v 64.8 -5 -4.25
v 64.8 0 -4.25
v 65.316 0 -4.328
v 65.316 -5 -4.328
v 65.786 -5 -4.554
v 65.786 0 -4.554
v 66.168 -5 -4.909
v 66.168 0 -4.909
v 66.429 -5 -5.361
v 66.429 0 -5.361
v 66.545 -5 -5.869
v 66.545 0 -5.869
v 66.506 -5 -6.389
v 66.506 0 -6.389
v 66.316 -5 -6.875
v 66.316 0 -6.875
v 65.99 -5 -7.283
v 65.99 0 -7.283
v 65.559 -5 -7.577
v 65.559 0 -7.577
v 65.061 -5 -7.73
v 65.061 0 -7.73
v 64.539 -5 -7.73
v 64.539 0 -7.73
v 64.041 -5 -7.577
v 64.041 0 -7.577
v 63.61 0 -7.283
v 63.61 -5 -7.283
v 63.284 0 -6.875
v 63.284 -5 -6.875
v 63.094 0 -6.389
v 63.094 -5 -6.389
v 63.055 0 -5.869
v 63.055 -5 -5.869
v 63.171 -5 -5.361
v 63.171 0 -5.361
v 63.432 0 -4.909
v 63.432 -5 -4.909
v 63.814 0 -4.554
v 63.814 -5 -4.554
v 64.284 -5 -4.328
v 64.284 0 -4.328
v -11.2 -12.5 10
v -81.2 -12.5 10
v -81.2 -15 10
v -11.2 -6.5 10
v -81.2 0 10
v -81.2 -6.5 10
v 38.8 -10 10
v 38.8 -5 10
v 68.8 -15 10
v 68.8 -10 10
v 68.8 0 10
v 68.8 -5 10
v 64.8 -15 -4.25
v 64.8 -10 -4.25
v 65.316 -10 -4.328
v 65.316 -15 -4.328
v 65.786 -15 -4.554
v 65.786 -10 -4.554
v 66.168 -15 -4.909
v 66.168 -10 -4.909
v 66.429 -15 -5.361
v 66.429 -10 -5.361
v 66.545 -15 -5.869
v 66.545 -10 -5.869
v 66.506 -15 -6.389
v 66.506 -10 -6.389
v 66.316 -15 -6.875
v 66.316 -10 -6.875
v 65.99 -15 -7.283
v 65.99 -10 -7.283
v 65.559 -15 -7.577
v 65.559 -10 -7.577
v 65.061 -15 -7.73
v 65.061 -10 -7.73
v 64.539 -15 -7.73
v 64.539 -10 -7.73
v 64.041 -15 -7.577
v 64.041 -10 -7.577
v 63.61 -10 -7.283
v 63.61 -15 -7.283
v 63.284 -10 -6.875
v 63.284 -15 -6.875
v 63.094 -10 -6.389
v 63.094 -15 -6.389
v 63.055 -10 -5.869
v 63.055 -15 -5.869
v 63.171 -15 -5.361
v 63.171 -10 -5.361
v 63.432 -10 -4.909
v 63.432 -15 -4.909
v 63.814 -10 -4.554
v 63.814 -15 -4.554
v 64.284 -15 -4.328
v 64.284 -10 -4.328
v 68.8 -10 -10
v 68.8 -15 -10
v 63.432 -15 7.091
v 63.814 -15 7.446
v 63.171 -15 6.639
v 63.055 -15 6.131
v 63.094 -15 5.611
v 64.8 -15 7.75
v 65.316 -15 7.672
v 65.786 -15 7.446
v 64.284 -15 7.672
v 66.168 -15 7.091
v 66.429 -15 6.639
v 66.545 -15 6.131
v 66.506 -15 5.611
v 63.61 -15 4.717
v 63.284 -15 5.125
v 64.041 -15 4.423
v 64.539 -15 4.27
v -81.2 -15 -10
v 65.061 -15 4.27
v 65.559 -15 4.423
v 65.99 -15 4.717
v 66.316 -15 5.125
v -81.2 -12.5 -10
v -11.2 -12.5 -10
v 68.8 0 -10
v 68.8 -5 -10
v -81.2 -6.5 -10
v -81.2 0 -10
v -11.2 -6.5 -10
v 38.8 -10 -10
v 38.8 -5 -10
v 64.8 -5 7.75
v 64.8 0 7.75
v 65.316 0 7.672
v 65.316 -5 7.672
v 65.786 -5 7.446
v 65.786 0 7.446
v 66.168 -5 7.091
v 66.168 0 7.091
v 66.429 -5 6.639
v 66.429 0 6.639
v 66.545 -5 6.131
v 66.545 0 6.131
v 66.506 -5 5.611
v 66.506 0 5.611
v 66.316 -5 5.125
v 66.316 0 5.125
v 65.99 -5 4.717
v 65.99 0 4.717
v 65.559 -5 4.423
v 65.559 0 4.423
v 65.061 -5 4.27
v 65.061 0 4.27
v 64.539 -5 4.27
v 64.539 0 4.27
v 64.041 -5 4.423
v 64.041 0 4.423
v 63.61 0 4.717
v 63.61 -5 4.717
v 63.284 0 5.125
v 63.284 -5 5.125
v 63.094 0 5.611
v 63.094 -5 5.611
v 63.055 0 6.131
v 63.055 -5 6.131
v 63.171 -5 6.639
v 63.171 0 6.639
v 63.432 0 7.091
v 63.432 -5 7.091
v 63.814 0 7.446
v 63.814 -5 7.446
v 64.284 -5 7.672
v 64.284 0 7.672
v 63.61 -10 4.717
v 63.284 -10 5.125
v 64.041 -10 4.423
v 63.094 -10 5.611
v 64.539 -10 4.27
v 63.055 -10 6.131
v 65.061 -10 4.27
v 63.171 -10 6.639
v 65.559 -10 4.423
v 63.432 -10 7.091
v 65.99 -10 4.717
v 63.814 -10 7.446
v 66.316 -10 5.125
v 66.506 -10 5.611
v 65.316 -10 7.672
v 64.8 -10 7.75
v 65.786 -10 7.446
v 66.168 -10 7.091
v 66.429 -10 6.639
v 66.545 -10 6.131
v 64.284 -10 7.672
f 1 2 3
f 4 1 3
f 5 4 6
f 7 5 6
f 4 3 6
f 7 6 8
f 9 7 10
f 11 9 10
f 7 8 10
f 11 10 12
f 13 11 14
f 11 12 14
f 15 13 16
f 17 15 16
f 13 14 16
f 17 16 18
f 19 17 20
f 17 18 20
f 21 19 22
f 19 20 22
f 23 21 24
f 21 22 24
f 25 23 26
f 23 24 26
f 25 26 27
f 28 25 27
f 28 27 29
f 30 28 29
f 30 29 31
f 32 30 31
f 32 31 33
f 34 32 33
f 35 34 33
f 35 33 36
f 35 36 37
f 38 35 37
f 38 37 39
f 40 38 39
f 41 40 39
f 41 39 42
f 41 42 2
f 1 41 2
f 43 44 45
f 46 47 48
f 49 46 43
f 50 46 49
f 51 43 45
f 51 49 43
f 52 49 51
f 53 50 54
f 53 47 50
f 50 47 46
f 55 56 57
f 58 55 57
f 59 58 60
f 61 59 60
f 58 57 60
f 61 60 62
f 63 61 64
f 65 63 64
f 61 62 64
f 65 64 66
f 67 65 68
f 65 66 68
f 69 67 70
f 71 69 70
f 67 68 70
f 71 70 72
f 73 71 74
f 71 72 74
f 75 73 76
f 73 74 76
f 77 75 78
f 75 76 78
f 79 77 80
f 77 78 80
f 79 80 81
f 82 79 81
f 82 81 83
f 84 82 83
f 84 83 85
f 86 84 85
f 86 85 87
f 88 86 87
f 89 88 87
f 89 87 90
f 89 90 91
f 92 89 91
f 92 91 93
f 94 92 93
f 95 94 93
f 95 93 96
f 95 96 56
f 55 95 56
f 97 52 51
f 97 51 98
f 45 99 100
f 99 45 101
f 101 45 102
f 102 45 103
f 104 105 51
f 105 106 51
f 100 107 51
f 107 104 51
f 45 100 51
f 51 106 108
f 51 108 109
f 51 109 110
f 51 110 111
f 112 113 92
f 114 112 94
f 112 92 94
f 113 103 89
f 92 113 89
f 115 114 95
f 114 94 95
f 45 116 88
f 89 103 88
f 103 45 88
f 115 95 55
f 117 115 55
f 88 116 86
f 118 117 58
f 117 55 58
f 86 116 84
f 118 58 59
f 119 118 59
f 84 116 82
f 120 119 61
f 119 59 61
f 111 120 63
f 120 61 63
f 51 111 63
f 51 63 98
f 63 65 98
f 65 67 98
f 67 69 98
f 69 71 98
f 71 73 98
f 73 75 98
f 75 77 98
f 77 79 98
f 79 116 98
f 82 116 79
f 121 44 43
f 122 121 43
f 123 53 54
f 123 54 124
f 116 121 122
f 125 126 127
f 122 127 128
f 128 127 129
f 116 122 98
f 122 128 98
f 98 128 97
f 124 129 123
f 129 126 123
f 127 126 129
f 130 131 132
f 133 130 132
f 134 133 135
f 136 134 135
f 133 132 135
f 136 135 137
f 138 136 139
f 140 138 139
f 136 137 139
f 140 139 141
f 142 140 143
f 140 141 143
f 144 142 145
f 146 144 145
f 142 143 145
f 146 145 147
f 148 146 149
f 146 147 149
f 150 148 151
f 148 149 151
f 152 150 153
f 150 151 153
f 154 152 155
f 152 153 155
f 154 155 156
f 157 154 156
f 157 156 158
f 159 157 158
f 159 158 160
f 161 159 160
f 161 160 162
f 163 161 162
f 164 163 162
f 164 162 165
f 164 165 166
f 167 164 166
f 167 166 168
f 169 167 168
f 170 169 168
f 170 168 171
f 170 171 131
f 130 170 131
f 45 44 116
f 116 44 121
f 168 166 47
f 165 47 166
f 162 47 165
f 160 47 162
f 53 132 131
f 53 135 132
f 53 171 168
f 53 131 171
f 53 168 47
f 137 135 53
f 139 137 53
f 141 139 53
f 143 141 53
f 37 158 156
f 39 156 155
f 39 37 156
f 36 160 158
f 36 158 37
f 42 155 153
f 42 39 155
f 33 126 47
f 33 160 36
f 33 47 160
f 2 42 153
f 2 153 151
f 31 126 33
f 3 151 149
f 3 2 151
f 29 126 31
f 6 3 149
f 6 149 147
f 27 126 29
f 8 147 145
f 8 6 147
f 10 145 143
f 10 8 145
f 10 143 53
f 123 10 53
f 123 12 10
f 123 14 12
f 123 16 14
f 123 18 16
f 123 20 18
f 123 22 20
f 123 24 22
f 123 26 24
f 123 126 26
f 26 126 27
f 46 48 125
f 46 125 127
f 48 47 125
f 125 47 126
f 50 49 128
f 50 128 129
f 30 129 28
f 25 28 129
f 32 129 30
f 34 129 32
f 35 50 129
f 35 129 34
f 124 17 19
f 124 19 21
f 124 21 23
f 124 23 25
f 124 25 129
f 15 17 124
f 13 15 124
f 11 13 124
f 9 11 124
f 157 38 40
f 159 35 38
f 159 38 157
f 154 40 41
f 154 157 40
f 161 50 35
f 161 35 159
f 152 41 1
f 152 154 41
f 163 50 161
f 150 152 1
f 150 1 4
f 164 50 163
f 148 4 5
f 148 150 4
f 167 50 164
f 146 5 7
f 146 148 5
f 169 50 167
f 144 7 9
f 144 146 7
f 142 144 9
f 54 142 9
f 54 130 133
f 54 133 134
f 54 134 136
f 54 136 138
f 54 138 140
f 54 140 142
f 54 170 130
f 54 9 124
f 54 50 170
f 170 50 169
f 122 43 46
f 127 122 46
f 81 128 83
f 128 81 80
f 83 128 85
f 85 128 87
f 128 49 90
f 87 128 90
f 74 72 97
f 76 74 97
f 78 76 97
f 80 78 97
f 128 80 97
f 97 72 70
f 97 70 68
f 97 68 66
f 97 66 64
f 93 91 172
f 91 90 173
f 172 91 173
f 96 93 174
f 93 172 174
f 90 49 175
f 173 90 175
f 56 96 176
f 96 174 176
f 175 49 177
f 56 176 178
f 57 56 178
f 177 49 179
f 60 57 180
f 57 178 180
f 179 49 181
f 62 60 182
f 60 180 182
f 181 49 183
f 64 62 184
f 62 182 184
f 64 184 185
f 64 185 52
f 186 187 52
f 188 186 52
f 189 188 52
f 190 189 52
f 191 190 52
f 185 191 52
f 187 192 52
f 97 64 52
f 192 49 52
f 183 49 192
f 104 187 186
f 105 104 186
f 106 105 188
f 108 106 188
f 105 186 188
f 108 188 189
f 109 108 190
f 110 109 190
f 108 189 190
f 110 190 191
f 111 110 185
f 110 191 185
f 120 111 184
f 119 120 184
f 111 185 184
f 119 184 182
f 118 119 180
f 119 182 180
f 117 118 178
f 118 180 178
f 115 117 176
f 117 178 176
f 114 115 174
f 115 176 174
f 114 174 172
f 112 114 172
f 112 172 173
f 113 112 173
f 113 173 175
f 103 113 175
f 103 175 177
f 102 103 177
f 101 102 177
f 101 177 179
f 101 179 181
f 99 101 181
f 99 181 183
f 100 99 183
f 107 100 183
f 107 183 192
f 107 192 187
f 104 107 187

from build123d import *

# Parameters (mm, degrees)
SKETCH1_W           = 150
SKETCH1_H           = 20
BOSS_EXTRUDE3_DEPTH = 15
SKETCH11_W          = 70
SKETCH11_H          = 6
CUT_EXTRUDE5_DEPTH  = 85.961403002
SKETCH12_W          = 30
SKETCH12_H          = 5
CUT_EXTRUDE6_DEPTH  = 85.961403002
SKETCH13_R          = 1.75
CUT_EXTRUDE7_DEPTH  = 84.177160327


with BuildPart() as part:
    # Sketch1 → Boss-Extrude3 (new body)
    with BuildSketch(Plane(origin=(0, 0, 0), x_dir=(1, 0, 0), z_dir=(0, 1, 0))):
        with Locations((-6.2, 0)):
            Rectangle(SKETCH1_W, SKETCH1_H)
    extrude(amount=-BOSS_EXTRUDE3_DEPTH)

    # Sketch11 → Cut-Extrude5 (cut, through all)
    with BuildSketch(Plane.XY.offset(10)):
        with Locations((-46.2, -9.5)):
            Rectangle(SKETCH11_W, SKETCH11_H)
    extrude(amount=-CUT_EXTRUDE5_DEPTH, mode=Mode.SUBTRACT)

    # Sketch12 → Cut-Extrude6 (cut, through all)
    with BuildSketch(Plane.XY.offset(10)):
        with Locations((53.8, -7.5)):
            Rectangle(SKETCH12_W, SKETCH12_H)
    extrude(amount=-CUT_EXTRUDE6_DEPTH, mode=Mode.SUBTRACT)

    # Sketch13 → Cut-Extrude7 (cut, through all)
    with BuildSketch(Plane(origin=(0, 0, 0), x_dir=(1, 0, 0), z_dir=(0, 1, 0))):
        with Locations(Location((64.8, -6, 0), (0, 0, 270))):
            Circle(SKETCH13_R)
        with Locations(Location((64.8, 6, 0), (0, 0, 270))):
            Circle(SKETCH13_R)
    extrude(amount=-CUT_EXTRUDE7_DEPTH, mode=Mode.SUBTRACT)


solid = part.part
